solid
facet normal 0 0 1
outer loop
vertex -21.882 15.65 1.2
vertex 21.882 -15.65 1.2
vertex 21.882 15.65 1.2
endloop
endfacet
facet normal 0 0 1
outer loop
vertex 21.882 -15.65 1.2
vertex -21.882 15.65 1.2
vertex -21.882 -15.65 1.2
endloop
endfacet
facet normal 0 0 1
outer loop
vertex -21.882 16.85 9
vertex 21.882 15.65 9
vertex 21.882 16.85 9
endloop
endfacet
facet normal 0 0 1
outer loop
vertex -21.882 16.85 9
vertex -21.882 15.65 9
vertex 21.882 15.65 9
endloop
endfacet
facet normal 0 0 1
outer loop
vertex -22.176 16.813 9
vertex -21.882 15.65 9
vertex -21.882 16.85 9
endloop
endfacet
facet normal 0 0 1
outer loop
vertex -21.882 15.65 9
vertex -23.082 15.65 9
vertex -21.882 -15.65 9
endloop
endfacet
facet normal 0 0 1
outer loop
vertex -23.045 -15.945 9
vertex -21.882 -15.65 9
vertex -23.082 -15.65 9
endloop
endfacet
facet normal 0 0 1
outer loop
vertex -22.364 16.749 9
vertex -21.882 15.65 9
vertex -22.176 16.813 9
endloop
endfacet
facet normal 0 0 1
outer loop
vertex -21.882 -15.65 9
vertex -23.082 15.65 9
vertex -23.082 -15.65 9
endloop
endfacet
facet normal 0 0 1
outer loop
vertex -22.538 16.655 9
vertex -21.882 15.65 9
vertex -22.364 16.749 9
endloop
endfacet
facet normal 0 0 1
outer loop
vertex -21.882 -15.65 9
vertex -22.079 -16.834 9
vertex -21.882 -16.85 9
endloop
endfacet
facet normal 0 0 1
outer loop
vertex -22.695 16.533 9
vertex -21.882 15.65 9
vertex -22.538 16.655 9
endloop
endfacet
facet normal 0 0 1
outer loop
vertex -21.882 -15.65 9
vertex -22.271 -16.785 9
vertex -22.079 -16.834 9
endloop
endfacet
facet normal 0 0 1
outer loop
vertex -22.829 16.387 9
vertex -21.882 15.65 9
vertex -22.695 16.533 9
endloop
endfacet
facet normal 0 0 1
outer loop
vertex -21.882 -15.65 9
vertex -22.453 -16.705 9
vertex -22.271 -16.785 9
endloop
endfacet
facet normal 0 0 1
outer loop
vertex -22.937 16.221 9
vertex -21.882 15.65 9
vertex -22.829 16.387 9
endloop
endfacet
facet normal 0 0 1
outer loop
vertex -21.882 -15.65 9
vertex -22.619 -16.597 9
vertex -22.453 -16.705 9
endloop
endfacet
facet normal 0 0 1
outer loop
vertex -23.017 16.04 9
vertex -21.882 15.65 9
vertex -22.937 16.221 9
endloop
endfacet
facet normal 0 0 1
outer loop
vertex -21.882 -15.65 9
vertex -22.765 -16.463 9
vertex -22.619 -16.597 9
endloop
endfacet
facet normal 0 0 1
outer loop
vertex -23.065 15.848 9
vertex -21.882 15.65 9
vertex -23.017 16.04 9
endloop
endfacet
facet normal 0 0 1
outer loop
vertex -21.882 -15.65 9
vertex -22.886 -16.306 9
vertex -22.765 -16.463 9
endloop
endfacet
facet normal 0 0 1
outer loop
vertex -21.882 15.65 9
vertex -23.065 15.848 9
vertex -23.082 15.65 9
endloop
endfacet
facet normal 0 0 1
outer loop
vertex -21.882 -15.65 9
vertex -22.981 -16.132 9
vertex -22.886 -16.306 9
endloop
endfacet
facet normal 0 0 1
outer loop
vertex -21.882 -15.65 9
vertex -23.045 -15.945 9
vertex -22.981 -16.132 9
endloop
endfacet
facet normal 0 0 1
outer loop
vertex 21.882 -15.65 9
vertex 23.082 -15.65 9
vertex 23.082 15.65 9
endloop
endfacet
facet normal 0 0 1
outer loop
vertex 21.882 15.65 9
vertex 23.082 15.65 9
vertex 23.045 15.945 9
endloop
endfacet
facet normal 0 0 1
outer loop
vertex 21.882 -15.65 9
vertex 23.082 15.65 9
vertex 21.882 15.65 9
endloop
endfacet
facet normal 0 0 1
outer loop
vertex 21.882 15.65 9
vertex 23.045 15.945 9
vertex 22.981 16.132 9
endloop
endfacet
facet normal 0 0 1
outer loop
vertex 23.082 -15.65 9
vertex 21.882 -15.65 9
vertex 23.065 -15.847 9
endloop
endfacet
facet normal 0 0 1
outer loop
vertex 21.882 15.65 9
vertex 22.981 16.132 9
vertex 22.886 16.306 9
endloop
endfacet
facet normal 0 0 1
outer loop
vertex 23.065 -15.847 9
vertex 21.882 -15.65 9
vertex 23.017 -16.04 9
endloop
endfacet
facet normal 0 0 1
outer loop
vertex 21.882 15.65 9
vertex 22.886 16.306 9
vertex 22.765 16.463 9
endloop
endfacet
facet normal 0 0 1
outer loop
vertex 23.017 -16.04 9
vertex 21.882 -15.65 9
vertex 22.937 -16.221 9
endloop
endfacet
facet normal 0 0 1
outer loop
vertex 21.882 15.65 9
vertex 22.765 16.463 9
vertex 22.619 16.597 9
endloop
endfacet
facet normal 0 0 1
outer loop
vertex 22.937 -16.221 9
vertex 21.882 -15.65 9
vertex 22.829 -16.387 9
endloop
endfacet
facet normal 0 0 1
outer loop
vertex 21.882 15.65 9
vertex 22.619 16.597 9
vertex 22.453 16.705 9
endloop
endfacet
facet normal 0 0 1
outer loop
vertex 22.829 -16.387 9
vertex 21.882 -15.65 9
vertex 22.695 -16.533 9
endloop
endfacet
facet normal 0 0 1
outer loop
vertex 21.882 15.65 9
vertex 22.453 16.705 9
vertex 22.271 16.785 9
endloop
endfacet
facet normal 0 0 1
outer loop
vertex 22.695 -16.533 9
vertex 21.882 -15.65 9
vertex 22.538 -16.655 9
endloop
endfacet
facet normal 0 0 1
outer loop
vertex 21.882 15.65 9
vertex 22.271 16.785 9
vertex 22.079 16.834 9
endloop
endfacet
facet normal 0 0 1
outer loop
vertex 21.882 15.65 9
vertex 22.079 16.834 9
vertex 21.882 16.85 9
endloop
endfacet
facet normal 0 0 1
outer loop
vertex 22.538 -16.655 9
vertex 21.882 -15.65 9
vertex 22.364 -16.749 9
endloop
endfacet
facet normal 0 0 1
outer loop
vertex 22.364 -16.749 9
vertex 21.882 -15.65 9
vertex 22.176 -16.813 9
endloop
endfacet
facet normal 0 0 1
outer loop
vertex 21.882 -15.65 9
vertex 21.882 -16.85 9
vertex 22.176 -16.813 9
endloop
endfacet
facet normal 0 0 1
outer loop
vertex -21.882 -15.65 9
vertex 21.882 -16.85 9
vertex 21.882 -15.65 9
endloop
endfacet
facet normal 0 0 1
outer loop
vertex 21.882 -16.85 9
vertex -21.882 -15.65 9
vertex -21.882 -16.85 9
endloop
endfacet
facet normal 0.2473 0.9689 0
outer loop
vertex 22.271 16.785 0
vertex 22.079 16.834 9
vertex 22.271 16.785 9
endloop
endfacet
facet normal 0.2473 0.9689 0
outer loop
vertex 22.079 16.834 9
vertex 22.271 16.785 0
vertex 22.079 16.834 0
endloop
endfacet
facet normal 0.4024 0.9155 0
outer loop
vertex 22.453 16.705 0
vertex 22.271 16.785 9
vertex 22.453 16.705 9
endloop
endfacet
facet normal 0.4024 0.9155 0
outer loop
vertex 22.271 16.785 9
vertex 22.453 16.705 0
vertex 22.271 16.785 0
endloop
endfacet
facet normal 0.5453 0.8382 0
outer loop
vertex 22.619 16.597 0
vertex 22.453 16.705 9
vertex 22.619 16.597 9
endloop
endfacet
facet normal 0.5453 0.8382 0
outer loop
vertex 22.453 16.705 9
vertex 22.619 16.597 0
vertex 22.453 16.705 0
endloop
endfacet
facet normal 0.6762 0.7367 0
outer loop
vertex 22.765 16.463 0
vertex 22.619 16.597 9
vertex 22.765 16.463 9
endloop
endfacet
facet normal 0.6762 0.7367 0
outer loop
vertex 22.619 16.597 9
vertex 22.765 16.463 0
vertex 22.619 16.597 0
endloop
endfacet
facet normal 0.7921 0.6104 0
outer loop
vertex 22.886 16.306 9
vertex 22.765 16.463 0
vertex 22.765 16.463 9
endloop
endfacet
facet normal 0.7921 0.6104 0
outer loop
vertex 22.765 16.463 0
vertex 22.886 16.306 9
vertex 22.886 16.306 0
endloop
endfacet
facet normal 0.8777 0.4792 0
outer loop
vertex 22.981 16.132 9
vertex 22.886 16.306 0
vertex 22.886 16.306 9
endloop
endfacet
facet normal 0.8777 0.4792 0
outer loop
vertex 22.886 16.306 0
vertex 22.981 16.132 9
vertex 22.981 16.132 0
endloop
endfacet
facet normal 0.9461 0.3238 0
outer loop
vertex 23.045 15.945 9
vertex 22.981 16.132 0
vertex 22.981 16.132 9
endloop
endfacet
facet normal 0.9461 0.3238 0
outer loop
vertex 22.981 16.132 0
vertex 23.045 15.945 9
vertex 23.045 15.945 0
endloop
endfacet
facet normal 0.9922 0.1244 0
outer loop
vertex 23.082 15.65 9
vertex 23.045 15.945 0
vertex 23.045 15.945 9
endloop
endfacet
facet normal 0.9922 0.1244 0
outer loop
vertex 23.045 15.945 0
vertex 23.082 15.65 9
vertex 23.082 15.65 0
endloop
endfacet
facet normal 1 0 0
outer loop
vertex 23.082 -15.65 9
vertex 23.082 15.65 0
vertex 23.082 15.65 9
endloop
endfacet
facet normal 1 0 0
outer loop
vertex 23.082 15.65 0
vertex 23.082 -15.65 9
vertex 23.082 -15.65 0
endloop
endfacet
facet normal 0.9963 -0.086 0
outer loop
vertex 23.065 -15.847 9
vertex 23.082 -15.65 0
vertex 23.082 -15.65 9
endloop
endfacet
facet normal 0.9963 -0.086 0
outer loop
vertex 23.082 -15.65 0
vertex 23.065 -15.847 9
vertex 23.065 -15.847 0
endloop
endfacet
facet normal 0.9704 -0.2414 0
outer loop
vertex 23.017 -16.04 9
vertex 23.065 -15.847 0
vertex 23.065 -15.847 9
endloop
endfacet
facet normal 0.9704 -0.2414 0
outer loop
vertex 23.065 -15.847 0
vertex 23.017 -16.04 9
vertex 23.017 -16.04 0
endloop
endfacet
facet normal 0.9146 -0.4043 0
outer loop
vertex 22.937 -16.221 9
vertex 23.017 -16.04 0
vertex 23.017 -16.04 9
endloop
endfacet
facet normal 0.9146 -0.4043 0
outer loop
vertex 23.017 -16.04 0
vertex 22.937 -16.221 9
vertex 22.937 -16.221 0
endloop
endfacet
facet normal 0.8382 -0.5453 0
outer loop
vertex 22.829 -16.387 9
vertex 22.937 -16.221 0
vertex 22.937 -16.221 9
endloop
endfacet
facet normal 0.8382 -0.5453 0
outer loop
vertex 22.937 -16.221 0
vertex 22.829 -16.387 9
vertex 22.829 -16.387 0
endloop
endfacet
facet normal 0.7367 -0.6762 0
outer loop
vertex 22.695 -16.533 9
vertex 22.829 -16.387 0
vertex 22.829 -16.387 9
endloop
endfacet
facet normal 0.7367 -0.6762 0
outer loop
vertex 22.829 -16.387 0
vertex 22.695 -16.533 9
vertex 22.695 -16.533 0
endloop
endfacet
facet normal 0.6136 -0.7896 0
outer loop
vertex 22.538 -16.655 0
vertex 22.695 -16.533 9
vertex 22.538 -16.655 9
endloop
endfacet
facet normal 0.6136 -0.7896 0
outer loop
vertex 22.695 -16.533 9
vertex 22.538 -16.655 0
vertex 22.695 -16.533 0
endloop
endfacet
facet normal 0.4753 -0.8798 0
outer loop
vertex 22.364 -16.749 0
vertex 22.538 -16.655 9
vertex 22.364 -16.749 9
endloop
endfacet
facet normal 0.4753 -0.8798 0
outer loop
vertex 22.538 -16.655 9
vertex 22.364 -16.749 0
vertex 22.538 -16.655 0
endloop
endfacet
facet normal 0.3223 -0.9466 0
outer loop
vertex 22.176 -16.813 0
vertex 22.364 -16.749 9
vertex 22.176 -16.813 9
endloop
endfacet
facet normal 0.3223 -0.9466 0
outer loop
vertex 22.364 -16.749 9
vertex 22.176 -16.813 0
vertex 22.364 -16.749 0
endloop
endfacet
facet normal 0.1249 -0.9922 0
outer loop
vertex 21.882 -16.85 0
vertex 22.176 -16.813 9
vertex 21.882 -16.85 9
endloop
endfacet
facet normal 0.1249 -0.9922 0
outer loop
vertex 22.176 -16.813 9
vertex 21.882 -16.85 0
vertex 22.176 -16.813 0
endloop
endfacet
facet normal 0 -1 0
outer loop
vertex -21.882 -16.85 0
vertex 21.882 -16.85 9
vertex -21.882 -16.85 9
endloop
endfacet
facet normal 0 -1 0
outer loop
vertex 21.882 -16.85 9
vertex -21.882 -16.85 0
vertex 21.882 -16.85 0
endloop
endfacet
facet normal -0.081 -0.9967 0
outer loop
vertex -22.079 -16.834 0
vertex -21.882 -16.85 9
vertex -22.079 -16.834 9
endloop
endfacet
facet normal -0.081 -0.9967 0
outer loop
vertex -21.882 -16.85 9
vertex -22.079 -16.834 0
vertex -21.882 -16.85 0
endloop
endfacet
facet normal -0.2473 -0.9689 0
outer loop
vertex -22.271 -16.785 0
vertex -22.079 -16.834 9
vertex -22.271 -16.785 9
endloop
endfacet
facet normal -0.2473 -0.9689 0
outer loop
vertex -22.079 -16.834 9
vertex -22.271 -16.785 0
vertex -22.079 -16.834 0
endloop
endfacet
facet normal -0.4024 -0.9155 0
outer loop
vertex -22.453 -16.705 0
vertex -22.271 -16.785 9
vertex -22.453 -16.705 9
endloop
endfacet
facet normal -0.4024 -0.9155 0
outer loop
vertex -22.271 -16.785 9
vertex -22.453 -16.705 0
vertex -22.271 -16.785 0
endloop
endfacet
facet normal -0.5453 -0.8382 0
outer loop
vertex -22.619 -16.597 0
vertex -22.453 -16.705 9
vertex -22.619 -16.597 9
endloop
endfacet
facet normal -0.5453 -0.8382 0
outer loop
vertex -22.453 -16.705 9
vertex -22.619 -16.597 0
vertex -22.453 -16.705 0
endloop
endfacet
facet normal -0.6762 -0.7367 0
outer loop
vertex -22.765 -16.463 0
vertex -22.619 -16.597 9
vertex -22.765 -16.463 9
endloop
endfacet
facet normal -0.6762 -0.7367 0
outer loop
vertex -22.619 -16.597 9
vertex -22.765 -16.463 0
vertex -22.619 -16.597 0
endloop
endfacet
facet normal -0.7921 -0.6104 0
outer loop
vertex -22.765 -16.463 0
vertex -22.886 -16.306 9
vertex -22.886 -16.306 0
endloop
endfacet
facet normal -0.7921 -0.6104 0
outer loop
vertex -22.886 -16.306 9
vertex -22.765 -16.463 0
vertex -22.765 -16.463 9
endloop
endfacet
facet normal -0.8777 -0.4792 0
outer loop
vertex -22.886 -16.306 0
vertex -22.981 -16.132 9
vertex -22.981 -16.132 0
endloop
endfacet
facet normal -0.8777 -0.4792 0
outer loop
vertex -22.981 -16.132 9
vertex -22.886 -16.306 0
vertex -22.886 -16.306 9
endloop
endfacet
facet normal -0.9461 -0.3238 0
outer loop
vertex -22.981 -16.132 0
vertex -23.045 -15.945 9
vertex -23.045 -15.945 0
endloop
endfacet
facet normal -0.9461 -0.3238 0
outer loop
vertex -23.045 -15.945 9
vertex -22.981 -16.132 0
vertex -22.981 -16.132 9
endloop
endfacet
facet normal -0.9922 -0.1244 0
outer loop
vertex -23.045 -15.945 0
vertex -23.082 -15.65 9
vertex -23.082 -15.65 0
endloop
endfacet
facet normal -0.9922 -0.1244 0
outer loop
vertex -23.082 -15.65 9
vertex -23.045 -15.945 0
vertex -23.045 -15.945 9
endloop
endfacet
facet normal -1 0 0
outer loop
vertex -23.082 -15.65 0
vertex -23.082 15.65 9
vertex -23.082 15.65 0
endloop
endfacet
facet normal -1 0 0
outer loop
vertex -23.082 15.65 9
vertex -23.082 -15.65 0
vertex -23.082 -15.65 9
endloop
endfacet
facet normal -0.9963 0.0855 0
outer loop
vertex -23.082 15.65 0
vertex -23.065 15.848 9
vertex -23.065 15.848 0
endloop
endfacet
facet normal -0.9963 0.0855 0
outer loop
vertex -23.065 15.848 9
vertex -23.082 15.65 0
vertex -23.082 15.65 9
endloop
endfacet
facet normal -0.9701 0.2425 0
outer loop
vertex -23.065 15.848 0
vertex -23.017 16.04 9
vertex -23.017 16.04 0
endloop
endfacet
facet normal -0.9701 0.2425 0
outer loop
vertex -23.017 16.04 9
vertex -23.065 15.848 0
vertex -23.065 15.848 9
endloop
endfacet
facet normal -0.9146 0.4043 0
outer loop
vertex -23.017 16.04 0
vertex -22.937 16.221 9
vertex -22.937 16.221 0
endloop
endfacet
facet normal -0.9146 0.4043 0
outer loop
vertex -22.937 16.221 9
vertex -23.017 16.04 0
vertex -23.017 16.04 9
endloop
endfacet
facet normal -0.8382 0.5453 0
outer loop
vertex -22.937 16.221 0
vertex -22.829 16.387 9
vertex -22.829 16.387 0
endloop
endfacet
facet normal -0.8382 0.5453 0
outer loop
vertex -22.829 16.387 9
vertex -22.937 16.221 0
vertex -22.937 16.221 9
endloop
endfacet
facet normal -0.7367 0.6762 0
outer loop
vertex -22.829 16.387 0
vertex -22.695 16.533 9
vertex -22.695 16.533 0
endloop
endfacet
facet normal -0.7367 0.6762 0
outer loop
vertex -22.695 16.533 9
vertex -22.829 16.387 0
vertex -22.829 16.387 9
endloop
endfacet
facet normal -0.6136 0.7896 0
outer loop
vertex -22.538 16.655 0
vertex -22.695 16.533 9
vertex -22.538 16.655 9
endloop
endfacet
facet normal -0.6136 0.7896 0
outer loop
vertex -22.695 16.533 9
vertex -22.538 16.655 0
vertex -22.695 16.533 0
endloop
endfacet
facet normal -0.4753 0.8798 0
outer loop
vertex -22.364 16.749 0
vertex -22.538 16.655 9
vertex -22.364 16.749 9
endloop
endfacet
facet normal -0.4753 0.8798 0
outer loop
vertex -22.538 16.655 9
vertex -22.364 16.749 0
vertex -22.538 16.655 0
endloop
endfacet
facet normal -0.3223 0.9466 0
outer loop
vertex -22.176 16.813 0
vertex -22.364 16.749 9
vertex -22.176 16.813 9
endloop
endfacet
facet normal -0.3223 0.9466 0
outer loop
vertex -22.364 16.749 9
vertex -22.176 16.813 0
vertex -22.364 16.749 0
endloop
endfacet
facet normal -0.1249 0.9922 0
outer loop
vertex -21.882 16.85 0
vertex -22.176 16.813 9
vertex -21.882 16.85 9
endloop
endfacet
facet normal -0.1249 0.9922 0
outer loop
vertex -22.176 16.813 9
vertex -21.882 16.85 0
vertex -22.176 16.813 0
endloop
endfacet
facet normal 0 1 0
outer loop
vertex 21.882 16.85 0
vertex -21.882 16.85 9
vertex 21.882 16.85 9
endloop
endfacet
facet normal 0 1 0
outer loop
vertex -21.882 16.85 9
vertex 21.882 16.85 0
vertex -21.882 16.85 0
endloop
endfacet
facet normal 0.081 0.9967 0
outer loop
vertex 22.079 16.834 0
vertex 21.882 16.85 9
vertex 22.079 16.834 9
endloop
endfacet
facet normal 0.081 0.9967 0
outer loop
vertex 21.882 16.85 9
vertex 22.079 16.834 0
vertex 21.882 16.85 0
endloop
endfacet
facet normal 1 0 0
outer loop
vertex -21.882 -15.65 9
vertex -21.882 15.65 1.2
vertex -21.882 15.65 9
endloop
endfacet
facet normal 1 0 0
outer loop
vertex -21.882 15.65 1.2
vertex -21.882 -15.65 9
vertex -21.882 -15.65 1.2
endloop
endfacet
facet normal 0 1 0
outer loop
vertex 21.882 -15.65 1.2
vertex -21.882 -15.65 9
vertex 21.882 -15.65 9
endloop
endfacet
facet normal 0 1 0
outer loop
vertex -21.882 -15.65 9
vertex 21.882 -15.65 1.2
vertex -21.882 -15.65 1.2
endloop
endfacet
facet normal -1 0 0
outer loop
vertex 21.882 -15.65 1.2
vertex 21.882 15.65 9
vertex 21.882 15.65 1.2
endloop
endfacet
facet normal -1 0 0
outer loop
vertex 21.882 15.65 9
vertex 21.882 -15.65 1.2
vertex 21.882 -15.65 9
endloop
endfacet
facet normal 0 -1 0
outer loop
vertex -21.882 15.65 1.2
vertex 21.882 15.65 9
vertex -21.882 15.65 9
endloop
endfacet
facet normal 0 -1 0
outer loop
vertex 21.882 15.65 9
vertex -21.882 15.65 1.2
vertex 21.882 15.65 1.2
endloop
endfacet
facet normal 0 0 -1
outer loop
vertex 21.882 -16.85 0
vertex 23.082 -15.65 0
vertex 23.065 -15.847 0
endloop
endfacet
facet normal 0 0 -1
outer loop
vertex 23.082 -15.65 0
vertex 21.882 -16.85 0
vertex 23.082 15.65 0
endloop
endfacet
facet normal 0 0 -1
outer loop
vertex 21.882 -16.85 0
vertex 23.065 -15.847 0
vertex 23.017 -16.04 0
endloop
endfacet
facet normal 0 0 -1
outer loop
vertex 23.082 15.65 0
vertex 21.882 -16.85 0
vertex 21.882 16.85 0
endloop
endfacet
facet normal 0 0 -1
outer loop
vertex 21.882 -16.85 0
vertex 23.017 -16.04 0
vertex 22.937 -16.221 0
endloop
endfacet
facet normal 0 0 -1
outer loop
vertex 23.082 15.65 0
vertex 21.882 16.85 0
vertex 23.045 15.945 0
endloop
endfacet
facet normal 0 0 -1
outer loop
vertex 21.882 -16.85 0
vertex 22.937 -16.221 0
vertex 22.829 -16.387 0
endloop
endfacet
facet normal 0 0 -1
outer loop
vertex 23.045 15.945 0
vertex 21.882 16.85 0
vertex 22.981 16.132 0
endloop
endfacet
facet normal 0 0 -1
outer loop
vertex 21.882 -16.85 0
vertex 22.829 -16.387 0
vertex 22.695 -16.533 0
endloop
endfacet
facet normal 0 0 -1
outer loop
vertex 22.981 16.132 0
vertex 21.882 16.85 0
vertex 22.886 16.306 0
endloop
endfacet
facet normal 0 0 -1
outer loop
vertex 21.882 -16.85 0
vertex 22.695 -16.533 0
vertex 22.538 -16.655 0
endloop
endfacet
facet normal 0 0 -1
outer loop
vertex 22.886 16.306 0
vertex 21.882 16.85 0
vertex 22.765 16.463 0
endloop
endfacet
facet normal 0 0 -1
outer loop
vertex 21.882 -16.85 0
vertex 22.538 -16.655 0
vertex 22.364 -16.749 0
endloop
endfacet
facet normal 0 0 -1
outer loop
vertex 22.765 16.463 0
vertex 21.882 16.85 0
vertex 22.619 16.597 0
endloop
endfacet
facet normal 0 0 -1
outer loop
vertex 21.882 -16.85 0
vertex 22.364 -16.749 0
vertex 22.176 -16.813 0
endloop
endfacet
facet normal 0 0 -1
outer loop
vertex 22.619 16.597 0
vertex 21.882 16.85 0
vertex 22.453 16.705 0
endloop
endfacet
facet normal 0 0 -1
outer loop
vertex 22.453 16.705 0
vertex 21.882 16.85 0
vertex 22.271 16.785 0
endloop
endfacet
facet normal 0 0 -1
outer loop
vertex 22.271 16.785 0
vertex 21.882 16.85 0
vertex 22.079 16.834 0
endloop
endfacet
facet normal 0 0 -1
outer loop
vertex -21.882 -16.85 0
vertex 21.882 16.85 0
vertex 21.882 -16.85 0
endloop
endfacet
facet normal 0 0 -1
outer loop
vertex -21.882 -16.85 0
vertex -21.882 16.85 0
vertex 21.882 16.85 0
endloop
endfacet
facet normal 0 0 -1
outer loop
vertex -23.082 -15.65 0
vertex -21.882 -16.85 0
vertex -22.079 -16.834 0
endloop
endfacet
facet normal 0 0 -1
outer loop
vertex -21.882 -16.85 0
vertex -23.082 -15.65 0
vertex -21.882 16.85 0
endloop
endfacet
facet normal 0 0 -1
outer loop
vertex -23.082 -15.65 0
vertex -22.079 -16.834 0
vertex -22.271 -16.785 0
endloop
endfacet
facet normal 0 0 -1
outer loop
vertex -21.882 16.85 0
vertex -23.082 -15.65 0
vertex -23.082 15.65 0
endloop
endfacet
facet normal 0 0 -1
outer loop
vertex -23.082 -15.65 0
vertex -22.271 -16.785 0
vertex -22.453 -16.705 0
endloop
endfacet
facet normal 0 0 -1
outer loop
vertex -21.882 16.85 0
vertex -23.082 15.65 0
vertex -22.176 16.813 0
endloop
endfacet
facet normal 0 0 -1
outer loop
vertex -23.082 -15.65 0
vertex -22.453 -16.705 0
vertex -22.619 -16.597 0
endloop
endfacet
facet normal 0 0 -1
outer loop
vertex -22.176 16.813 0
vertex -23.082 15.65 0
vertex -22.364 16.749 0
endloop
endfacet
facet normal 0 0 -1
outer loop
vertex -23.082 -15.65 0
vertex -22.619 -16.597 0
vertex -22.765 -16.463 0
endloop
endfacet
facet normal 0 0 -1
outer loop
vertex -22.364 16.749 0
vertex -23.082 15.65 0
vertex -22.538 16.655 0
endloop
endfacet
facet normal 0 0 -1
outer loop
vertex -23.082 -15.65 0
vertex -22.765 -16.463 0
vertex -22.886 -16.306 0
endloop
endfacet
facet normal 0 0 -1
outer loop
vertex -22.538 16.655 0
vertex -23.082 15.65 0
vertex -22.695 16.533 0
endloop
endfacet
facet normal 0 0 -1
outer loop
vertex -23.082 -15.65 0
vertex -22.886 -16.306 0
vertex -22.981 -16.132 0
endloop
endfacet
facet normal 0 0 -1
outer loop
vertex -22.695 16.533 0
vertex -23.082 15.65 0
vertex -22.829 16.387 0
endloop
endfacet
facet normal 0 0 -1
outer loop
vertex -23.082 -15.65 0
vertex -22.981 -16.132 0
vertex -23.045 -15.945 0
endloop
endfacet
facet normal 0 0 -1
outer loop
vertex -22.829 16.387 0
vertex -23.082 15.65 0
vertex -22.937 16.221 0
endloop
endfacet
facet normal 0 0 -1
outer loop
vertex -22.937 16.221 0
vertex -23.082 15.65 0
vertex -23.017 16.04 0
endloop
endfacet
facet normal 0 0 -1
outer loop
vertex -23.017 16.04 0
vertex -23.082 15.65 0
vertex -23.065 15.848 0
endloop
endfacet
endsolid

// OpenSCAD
/* [Rendering options] */
// Show placeholder PCB in OpenSCAD preview
show_pcb = false;
// Lid mounting method
lid_model = "cap"; // [cap, inner-fit]
// Conditional rendering
render = "case"; // [all, case, lid]


/* [Dimensions] */
// Height of the PCB mounting stand-offs between the bottom of the case and the PCB
standoff_height = 5;
// PCB thickness
pcb_thickness = 1.6;
// Bottom layer thickness
floor_height = 1.2;
// Case wall thickness
wall_thickness = 1.2;
// Space between the top of the PCB and the top of the case
headroom = 0;

/* [Hidden] */
$fa=$preview ? 10 : 4;
$fs=0.2;
inner_height = floor_height + standoff_height + pcb_thickness + headroom;

module wall (thickness, height) {
    linear_extrude(height, convexity=10) {
        difference() {
            offset(r=thickness)
                children();
            children();
        }
    }
}

module bottom(thickness, height) {
    linear_extrude(height, convexity=3) {
        offset(r=thickness)
            children();
    }
}

module lid(thickness, height, edge) {
    linear_extrude(height, convexity=10) {
        offset(r=thickness)
            children();
    }
    translate([0,0,-edge])
    difference() {
        linear_extrude(edge, convexity=10) {
                offset(r=-0.2)
                children();
        }
        translate([0,0, -0.5])
         linear_extrude(edge+1, convexity=10) {
                offset(r=-1.2)
                children();
        }
    }
}


module box(wall_thick, bottom_layers, height) {
    if (render == "all" || render == "case") {
        translate([0,0, bottom_layers])
            wall(wall_thick, height) children();
        bottom(wall_thick, bottom_layers) children();
    }
    
    if (render == "all" || render == "lid") {
        translate([0, 0, height+bottom_layers+0.1])
        lid(wall_thick, bottom_layers, lid_model == "inner-fit" ? headroom-2.5: bottom_layers) 
            children();
    }
}

module mount(drill, space, height) {
    translate([0,0,height/2])
        difference() {
            cylinder(h=height, r=(space/2), center=true);
            cylinder(h=(height*2), r=(drill/2), center=true);
            
            translate([0, 0, height/2+0.01])
                children();
        }
        
}

module connector(min_x, min_y, max_x, max_y, height) {
    size_x = max_x - min_x;
    size_y = max_y - min_y;
    translate([(min_x + max_x)/2, (min_y + max_y)/2, height/2])
        cube([size_x, size_y, height], center=true);
}

module pcb() {
    thickness = 1.6;

    color("#009900")
    difference() {
        linear_extrude(thickness) {
            polygon(points = [[149.007025,89.508975], [149.268629,89.558579], [149.41387086,89.57128491600001], [149.554695528,89.609023284], [149.68683000000001,89.670632508], [149.80625955600001,89.75425578000001], [149.90934585600002,89.857350444], [149.992969128,89.97678], [150.054586716,90.10891447200001], [150.092325084,90.24973914], [150.105025,90.394975], [150.105025,95.594975], [150.09134899999998,95.751255], [150.050741,95.902788], [149.98443799999998,96.04497], [149.894456,96.17348100000001], [149.78353099999998,96.284406], [149.65501999999998,96.37438800000001], [149.512838,96.440691], [149.361305,96.481299], [149.205025,96.494975], [109.241421,96.458579], [109.100633,96.447501], [108.963302,96.414534], [108.832829,96.360489], [108.71240900000001,96.286698], [108.60502100000001,96.194979], [108.51330200000001,96.087591], [108.43951100000001,95.96717100000001], [108.38546600000001,95.83669800000001], [108.35249900000001,95.69936700000001], [108.341421,95.558579], [108.341421,67.194975]]);
        }
    translate([0, 0, -1])
    linear_extrude(thickness+2) 
        polygon(points = [[108.341421,67.194975], [108.355091,67.038695], [108.39569900000001,66.887162], [108.462002,66.74498], [108.551984,66.616469], [108.662909,66.505535], [108.79142,66.415553], [108.93360200000001,66.349259], [109.08513500000001,66.308651], [109.241421,66.294975], [149.168629,66.294975], [149.324915,66.308651], [149.476448,66.349259], [149.61863,66.415553], [149.747141,66.505535], [149.858066,66.616469], [149.948048,66.74498], [150.014351,66.887162], [150.054959,67.038695], [150.068629,67.194975], [150.068629,77.958579], [150.05755100000002,78.099367], [150.024584,78.236698], [149.970539,78.367171], [149.896748,78.487591], [149.80502900000002,78.594979], [149.697641,78.68669799999999], [149.577221,78.76048899999999], [149.446748,78.814534], [149.309417,78.847501], [149.168629,78.858579], [149.007025,78.840975]]);

    }
}

module case_outline() {
    polygon(points = [[107.341421,66.194975], [151.105025,66.194975], [151.105025,97.494975], [107.341421,97.494975]]);
}

rotate([render == "lid" ? 180 : 0, 0, 0])
scale([1, -1, 1])
translate([-129.22322300000002, -81.844975, 0]) {
    pcb_top = floor_height + standoff_height + pcb_thickness;

    difference() {
        box(wall_thickness, floor_height, inner_height) {
            case_outline();
        }

    }

    if (show_pcb && $preview) {
        translate([0, 0, floor_height + standoff_height])
            pcb();
    }

    if (render == "all" || render == "case") {
    }
}
